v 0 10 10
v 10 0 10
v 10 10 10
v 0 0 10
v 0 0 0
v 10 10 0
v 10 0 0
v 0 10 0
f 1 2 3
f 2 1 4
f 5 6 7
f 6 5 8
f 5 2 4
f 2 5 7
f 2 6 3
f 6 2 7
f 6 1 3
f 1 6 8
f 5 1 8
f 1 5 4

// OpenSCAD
//linear_extrude(height=5)
//text("Gonza", size =10,halign="center",font="Liberation Sans", $fn=20);

cube(10);

text("Openscad", font ="Liberation Sans");
